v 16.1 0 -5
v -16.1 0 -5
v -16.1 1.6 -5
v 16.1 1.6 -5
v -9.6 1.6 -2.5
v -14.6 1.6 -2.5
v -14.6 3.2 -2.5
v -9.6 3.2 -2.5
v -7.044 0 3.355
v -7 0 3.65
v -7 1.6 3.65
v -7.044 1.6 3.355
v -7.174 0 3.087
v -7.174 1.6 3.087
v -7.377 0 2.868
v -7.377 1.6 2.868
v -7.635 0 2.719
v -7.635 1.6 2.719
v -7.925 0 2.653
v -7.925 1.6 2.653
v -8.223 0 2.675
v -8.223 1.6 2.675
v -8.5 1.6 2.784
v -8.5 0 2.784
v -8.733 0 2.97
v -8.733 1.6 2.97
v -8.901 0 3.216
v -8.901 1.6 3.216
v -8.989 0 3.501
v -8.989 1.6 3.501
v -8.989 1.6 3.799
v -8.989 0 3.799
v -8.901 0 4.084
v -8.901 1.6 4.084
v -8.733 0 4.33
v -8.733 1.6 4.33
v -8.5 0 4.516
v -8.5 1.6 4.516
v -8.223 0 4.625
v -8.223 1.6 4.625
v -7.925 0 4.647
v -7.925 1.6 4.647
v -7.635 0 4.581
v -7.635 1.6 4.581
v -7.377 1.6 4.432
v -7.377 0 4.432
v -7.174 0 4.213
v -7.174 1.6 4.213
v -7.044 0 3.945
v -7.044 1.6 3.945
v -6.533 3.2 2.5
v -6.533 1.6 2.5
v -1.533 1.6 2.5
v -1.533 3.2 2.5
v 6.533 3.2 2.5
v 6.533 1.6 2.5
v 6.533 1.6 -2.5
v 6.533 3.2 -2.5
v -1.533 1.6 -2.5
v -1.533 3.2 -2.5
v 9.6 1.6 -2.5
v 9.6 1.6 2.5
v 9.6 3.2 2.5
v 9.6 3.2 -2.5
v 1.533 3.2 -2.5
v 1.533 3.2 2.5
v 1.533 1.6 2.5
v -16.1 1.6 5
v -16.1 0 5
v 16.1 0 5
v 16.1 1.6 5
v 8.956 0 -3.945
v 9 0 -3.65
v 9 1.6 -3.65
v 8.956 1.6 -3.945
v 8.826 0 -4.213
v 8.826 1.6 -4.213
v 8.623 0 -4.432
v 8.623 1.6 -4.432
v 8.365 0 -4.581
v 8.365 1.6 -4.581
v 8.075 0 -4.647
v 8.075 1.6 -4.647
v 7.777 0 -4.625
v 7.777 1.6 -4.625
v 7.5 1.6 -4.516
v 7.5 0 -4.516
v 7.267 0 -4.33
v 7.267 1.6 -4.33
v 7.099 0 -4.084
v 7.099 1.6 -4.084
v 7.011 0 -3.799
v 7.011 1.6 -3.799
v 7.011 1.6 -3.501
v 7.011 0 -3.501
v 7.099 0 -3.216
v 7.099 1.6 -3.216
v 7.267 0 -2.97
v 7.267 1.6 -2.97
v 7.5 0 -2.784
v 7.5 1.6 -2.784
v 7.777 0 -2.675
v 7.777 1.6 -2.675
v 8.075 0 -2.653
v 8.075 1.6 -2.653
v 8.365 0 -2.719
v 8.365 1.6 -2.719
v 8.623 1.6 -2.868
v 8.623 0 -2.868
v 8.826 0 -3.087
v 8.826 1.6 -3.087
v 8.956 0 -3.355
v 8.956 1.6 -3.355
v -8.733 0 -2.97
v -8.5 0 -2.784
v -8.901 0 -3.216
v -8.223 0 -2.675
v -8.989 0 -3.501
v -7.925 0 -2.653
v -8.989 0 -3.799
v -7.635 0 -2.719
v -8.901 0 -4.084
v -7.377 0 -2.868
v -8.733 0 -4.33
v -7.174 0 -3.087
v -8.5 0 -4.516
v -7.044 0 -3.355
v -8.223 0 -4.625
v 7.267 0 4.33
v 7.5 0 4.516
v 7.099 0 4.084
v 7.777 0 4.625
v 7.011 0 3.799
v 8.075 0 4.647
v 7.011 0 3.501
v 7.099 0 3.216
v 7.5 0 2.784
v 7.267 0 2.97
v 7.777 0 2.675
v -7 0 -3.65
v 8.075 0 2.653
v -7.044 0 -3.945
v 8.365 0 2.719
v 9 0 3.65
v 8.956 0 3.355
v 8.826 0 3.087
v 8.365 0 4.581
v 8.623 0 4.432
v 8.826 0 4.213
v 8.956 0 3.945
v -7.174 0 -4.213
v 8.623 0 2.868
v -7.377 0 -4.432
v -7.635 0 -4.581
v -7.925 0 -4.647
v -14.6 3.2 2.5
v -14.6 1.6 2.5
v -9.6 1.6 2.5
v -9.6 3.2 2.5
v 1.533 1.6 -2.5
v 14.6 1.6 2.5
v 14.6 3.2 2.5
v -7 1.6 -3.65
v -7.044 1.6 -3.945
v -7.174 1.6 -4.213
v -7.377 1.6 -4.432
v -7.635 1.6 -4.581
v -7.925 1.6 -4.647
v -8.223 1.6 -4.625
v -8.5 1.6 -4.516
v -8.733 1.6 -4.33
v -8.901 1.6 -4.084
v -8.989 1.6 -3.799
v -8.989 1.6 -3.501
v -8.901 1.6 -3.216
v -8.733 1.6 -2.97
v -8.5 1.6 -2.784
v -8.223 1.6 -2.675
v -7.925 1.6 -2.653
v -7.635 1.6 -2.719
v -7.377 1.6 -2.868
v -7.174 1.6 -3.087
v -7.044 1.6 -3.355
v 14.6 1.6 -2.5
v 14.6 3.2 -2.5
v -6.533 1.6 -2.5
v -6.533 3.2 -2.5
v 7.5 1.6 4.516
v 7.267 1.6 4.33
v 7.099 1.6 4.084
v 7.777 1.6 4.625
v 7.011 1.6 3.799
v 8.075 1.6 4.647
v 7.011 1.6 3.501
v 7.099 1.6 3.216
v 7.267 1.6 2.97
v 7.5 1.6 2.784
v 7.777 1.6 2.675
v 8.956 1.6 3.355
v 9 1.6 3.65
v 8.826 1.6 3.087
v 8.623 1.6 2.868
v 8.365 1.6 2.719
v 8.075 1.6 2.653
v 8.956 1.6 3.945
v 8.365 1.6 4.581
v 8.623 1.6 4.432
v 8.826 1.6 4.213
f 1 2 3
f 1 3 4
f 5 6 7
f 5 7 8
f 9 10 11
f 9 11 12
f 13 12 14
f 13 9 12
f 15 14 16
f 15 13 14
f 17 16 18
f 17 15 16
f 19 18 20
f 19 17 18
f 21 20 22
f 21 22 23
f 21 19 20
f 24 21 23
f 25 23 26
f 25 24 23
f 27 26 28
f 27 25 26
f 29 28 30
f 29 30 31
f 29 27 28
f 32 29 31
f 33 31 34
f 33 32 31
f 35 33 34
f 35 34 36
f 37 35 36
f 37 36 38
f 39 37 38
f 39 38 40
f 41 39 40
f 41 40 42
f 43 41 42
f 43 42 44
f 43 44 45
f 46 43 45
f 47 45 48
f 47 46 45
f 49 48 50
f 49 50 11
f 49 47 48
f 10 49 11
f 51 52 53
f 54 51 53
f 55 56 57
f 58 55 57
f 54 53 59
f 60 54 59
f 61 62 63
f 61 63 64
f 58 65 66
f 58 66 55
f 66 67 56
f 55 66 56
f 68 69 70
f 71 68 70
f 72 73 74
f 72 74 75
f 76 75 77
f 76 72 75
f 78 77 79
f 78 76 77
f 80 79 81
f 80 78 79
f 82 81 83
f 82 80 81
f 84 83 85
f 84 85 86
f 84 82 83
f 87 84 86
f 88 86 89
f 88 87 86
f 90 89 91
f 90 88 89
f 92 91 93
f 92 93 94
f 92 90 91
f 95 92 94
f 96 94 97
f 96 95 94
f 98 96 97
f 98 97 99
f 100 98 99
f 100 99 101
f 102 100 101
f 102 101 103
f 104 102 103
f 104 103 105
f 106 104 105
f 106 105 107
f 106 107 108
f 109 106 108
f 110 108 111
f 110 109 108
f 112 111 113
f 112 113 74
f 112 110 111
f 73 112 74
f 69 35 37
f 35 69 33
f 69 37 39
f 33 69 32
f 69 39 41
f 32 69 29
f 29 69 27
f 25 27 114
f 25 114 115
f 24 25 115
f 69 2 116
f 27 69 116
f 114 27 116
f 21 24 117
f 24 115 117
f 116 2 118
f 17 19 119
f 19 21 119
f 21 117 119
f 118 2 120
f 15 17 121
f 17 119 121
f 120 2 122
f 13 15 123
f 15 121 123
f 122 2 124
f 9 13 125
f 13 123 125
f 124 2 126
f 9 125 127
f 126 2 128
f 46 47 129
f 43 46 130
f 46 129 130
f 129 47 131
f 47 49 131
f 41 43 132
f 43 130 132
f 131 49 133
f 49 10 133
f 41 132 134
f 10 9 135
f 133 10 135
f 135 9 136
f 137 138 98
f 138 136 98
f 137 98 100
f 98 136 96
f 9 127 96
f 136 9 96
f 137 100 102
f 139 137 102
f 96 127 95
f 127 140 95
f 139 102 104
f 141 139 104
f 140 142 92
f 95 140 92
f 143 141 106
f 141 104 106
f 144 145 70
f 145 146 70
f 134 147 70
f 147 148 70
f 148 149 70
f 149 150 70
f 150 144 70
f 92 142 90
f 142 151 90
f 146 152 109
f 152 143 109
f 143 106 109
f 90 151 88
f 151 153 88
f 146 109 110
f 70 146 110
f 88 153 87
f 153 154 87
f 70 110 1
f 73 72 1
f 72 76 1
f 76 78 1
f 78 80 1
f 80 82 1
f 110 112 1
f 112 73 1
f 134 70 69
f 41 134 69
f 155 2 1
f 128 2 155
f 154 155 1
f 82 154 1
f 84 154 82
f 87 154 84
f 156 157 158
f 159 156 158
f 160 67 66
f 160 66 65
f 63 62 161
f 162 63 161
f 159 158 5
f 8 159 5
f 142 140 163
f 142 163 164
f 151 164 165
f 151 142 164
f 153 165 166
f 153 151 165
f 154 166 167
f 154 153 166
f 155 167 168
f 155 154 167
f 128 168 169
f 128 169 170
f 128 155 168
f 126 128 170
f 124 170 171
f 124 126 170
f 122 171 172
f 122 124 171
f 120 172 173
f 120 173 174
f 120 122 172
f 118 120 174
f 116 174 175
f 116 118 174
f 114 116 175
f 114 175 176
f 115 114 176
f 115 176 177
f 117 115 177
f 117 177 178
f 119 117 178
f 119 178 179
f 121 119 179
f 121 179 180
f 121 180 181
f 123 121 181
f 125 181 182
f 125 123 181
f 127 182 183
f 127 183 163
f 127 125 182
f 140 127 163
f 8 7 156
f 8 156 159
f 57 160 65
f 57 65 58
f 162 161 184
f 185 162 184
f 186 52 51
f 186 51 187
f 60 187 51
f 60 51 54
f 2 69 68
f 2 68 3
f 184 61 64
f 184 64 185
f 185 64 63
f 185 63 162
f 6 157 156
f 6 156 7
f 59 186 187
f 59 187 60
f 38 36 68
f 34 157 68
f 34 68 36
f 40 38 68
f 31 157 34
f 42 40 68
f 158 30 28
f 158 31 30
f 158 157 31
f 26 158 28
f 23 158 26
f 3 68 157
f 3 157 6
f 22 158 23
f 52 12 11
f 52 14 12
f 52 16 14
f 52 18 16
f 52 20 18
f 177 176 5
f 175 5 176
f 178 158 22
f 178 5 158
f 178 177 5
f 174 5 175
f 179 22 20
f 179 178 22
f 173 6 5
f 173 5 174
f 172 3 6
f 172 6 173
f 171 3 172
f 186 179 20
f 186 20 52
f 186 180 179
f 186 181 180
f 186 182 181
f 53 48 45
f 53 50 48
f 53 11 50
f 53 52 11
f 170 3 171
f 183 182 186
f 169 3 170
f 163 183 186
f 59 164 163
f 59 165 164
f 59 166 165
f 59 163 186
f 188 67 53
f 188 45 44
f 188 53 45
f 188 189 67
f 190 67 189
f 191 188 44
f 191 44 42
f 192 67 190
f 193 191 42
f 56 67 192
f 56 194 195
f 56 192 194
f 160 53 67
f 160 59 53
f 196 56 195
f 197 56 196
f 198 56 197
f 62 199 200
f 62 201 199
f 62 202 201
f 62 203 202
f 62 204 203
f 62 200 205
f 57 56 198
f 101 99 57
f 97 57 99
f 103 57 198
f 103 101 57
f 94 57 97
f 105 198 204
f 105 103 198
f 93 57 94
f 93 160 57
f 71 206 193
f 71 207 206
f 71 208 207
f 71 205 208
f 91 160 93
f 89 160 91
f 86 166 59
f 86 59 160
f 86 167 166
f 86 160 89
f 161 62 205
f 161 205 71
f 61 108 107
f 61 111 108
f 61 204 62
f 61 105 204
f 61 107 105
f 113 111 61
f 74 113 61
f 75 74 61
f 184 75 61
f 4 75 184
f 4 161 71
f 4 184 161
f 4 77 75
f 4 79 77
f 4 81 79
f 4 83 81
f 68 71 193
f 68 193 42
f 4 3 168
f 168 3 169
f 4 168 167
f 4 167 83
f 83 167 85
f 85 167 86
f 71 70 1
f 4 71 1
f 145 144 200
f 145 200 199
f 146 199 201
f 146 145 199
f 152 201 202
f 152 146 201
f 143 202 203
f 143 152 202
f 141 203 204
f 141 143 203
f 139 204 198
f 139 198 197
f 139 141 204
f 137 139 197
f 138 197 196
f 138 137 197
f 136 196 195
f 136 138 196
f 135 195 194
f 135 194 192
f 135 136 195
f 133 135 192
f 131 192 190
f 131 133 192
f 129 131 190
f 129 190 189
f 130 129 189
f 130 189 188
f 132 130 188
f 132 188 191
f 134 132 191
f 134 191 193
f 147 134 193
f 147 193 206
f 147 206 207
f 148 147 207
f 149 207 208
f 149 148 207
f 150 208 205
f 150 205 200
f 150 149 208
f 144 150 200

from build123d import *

# Parameters (mm, degrees)
SKETCH1_W           = 32.2
SKETCH1_H           = 10
SKETCH1_R           = 1
PCB_DEPTH           = 1.6
SKETCH2_W           = 5
SKETCH2_H           = 5
BOSS_EXTRUDE2_DEPTH = 1.6


with BuildPart() as part:
    # Sketch1 → PCB (new body)
    with BuildSketch(Plane(origin=(0, 0, 0), x_dir=(1, 0, 0), z_dir=(0, 1, 0))):
        Rectangle(SKETCH1_W, SKETCH1_H)
        with Locations((-8, 3.65)):
            Circle(SKETCH1_R, mode=Mode.SUBTRACT)
        with Locations((8, 3.65)):
            Circle(SKETCH1_R, mode=Mode.SUBTRACT)
        with Locations((8, -3.65)):
            Circle(SKETCH1_R, mode=Mode.SUBTRACT)
        with Locations((-8, -3.65)):
            Circle(SKETCH1_R, mode=Mode.SUBTRACT)
    extrude(amount=PCB_DEPTH)

    # Sketch2 → Boss-Extrude2 (add)
    with BuildSketch(Plane(origin=(0, 1.6, 0), x_dir=(1, 0, 0), z_dir=(0, 1, 0))):
        with Locations((-12.1, 0)):
            Rectangle(SKETCH2_W, SKETCH2_H)
        with Locations((-4.033333333, 0)):
            Rectangle(SKETCH2_W, SKETCH2_H)
        with Locations((4.033333333, 0)):
            Rectangle(SKETCH2_W, SKETCH2_H)
        with Locations((12.1, 0)):
            Rectangle(SKETCH2_W, SKETCH2_H)
    extrude(amount=BOSS_EXTRUDE2_DEPTH)


solid = part.part
